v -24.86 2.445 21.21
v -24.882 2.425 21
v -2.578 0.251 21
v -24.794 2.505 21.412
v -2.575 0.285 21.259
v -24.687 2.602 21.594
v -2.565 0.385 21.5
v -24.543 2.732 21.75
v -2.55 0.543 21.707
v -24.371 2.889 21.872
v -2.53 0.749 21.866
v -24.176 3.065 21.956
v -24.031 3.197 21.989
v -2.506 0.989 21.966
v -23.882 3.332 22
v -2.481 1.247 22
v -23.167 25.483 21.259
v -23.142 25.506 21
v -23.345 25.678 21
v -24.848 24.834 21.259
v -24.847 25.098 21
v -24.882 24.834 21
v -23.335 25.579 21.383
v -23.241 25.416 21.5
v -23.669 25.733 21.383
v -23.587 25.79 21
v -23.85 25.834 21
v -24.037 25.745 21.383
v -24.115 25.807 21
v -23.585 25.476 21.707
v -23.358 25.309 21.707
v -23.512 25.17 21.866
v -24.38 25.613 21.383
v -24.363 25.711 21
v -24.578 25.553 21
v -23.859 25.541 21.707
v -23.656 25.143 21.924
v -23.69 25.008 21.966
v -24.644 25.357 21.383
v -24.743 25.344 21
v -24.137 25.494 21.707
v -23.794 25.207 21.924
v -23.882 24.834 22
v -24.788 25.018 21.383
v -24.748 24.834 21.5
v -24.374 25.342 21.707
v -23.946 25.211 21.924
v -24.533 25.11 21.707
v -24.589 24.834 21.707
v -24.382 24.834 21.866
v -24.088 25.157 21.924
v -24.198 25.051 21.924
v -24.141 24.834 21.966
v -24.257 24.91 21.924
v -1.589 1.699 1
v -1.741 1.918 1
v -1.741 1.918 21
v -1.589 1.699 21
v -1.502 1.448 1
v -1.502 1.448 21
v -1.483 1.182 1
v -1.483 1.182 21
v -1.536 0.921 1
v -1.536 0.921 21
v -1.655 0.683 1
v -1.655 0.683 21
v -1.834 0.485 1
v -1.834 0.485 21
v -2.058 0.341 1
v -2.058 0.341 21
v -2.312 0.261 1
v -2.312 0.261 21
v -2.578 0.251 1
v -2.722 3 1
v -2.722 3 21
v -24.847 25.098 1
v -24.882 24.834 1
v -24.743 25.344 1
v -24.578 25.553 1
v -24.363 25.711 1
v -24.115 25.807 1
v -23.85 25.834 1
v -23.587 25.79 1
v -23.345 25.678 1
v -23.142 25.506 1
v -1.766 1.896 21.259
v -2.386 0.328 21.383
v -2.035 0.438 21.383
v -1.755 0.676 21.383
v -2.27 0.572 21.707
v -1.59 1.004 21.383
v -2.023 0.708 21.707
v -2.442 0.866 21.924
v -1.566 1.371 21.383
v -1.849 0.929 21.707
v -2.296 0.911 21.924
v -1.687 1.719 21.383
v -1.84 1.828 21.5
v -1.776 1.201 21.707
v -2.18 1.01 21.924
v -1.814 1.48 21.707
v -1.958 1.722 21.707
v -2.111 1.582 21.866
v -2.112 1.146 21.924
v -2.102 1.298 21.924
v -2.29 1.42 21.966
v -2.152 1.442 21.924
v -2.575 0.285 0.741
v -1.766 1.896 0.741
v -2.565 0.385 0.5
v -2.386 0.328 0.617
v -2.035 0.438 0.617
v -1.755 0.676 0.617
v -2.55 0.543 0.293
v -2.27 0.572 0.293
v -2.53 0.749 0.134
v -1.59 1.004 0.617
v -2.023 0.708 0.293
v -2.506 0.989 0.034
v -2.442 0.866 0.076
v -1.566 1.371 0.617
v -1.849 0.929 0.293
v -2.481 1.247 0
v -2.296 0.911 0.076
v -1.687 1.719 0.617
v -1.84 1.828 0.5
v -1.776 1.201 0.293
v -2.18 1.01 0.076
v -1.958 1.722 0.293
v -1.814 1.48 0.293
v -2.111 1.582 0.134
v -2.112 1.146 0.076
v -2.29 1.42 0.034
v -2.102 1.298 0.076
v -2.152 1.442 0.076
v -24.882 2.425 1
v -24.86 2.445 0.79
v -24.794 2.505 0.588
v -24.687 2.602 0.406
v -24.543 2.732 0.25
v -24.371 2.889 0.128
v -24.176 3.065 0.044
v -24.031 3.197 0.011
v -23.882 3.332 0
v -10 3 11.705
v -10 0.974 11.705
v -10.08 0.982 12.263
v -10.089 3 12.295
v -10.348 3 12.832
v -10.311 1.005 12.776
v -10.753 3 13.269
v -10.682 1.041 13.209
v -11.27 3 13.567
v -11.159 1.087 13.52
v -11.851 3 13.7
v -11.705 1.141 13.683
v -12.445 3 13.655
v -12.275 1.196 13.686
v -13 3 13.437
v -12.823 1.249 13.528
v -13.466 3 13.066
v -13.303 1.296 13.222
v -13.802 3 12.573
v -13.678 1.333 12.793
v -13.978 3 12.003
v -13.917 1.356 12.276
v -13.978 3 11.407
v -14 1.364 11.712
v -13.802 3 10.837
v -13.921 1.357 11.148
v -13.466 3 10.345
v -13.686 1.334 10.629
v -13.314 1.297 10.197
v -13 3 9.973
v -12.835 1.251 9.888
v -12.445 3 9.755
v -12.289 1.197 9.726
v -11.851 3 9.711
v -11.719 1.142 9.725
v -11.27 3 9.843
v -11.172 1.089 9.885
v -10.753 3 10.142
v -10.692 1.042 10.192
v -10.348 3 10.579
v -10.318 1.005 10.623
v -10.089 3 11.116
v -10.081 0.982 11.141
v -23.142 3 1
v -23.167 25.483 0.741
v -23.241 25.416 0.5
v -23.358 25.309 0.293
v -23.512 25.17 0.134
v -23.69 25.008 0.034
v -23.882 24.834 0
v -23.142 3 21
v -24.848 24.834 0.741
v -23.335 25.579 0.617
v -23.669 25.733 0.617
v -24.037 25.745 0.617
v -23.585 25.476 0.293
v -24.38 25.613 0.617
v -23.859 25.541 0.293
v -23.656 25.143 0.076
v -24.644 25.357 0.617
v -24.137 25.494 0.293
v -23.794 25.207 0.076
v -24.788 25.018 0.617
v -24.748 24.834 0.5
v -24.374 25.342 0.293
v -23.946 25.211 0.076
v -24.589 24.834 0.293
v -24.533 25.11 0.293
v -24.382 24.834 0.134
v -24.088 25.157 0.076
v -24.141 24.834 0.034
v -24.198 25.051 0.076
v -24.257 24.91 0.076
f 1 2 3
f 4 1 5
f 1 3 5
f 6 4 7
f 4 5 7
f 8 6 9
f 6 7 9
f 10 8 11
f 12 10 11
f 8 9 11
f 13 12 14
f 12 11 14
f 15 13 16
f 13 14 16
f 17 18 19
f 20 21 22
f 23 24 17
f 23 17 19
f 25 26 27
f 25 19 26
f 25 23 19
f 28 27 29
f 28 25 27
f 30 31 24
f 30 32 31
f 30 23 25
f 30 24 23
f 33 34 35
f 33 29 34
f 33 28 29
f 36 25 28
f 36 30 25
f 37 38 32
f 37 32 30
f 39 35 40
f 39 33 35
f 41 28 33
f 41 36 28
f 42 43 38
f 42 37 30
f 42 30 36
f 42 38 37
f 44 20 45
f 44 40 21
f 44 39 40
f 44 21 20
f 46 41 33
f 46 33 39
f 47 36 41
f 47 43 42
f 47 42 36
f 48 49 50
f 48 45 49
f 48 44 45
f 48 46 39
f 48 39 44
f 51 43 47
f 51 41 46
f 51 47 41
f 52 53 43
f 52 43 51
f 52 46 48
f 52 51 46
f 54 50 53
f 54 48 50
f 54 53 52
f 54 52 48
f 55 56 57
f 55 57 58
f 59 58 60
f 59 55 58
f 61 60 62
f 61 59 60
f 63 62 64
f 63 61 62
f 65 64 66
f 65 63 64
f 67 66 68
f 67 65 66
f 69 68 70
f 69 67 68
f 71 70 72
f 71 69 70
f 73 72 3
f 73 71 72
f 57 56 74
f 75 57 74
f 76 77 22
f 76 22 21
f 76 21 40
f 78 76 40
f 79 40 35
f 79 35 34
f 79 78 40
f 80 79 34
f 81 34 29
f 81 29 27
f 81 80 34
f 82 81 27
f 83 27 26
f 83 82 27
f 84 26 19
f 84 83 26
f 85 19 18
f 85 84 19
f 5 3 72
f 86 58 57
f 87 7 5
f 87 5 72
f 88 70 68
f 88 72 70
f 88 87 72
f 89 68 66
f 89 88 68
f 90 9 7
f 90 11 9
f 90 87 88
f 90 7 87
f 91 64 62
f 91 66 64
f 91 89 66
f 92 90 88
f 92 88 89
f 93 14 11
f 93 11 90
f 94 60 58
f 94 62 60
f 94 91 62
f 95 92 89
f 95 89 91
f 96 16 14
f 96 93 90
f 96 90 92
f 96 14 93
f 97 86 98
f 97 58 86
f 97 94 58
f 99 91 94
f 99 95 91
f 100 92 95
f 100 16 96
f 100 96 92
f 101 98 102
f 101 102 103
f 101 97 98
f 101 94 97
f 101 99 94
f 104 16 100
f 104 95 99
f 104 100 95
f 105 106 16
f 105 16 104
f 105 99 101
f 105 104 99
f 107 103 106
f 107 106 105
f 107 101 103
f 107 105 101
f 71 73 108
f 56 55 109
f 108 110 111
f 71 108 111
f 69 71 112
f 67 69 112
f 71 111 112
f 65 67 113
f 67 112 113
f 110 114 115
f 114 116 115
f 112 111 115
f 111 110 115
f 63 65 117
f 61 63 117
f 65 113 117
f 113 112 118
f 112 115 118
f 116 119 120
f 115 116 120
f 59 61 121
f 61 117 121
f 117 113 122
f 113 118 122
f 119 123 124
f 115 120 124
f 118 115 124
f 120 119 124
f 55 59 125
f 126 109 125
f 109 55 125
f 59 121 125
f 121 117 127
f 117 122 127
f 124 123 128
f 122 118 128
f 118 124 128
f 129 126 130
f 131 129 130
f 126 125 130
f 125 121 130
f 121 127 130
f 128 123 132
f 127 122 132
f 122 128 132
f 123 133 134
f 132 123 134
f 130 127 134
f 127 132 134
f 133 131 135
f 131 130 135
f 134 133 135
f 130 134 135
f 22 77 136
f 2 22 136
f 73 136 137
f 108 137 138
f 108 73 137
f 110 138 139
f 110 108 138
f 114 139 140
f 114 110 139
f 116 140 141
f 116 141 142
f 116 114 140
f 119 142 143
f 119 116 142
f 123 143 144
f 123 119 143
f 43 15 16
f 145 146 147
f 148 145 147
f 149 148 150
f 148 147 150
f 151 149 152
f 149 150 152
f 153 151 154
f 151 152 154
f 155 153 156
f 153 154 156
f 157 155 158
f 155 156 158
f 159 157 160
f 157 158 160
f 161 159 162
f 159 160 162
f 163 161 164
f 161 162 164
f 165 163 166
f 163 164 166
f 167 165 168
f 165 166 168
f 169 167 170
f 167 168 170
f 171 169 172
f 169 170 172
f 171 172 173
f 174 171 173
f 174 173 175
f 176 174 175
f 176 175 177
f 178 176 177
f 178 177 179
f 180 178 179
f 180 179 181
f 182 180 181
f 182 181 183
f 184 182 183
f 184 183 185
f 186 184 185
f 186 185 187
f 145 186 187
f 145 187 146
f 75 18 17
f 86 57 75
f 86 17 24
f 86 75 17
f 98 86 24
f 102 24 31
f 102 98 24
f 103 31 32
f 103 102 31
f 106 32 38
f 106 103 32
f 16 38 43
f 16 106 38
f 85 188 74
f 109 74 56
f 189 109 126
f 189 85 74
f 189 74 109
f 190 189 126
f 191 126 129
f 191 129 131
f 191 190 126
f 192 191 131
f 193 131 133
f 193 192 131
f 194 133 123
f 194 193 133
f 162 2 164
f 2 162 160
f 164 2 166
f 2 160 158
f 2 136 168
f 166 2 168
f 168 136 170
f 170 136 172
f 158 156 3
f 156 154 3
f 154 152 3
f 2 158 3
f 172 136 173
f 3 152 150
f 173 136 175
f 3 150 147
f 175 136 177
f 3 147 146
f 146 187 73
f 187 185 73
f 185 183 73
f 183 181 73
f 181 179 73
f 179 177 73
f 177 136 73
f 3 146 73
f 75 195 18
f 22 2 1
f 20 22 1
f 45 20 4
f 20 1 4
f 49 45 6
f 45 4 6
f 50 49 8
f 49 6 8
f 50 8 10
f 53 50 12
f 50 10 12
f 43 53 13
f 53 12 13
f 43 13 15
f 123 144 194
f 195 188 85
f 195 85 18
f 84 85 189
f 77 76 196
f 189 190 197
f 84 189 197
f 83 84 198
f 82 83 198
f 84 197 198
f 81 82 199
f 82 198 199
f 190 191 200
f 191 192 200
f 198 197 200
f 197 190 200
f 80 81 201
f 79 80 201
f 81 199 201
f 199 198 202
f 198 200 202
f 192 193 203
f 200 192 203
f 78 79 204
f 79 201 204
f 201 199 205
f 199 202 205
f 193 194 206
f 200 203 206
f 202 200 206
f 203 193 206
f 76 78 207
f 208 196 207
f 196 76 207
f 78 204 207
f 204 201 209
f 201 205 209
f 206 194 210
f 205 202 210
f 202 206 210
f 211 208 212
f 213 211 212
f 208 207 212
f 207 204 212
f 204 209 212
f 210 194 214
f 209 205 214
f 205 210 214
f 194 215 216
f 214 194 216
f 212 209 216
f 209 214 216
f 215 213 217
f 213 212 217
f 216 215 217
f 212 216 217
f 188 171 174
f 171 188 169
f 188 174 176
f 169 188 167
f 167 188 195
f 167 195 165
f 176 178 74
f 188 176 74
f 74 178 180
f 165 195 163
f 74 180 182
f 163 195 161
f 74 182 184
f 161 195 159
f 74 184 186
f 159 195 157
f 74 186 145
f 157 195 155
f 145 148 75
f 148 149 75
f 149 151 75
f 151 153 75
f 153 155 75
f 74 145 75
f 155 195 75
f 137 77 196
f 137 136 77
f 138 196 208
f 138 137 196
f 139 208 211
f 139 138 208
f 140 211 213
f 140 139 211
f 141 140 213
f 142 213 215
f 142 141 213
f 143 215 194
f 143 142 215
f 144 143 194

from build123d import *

# Parameters (mm, degrees)
F1_DEPTH     = 22
F2_R         = 1
F3_T1_DEPTH  = 31.8493182741
F3_T3_DEPTH  = 27.4759989859
F3_T8_DEPTH  = 1
F3_T14_DEPTH = 1
F4_R         = 1
F6_W         = 20.563358571
F6_H         = 20
F7_DEPTH     = 25
F9_D         = 4


# Not quite as in the source:
# - a fillet or chamfer that OpenCascade refuses, or shapes differently, is made with other operations: its cross-section is extruded or revolved along the edge and cut away or added


with BuildPart() as f1:
    # F0 (on Top) → F1 (new body)
    with BuildSketch(Plane.XY):
        Polygon((-24.8821492983, 2.4245919862), (0, 0), (-24.8821492983, 27.4245919862), align=None)
    extrude(amount=F1_DEPTH)

    # F2
    f2_edges = [f1.edges().sort_by_distance(p)[0] for p in [
        (-24.882149, 14.924592, 22),
        (-12.441075, 1.212296, 22),
    ]]
    fillet(f2_edges, radius=F2_R)

    # F3: fillet of radius 1 on 1 edges, made by hand

    # F3_s2 → F3_t1 (cut)
    with BuildSketch(Plane(origin=(-1.7406023493, 1.9184560251, 0), x_dir=(0, 0, 1), z_dir=(-0.6719435693, 0.7406023493, 0))):
        with BuildLine():
            ThreePointArc((21, 0), (21.7071067812, -0.2928932188), (22, -1))
            Line((22, -1), (22, 0))
            Line((22, 0), (21, 0))
        make_face()
    extrude(amount=F3_T1_DEPTH, mode=Mode.SUBTRACT)

    # F3_s4 → F3_t3 (cut)
    with BuildSketch(Plane.XY.offset(-6.4759989859)):
        with BuildLine():
            ThreePointArc((-24.8821492983, 24.8341923918), (-24.2422865296, 25.7670917297), (-23.141546949, 25.5061359611))
            Line((-23.141546949, 25.5061359611), (-24.8821492983, 27.4245919862))
            Line((-24.8821492983, 27.4245919862), (-24.8821492983, 24.8341923918))
        make_face()
        with BuildLine():
            ThreePointArc((-1.7406023493, 1.9184560251), (-1.5876305081, 0.7975969112), (-2.578188378, 0.2512264839))
            Line((-2.578188378, 0.2512264839), (0, 0))
            Line((0, 0), (-1.7406023493, 1.9184560251))
        make_face()
    extrude(amount=F3_T3_DEPTH, mode=Mode.SUBTRACT)


with BuildPart() as f3_tool6:
    # F3_s7 → F3_t8 (new body)
    with BuildSketch(Plane.XY.offset(21)):
        Polygon((-2.4812046985, 1.2465124558), (-1.7406023493, 1.9184560251), (0, 0), (-2.578188378, 0.2512264839), align=None)
    extrude(amount=F3_T8_DEPTH)

    # F3_s9 → F3_t10 (revolve, cut)
    with BuildSketch(Plane(origin=(-2.4812046985, 1.2465124558, 21), x_dir=(-0.8935741904, 0.4489155446, 0), z_dir=(0.4489155446, 0.8935741904, 0))):
        with BuildLine():
            ThreePointArc((0, -1), (1, 0), (0, 1))
            Line((0, 1), (0, -1))
        make_face()
    revolve(axis=Axis((-2.4812046985, 1.2465124558, 21), (0, 0, 1)), mode=Mode.SUBTRACT)


with BuildPart() as f1_1:
    add(f1.part)

    # F3_t5: cut F3_tool6
    add(f3_tool6.part, mode=Mode.SUBTRACT)


with BuildPart() as f3_tool12:
    # F3_s13 → F3_t14 (new body)
    with BuildSketch(Plane.XY.offset(21)):
        Polygon((-23.8821492983, 24.8341923918), (-24.8821492983, 24.8341923918), (-24.8821492983, 27.4245919862), (-23.141546949, 25.5061359611), align=None)
    extrude(amount=F3_T14_DEPTH)

    # F3_s15 → F3_t16 (revolve, cut)
    with BuildSketch(Plane(origin=(-23.8821492983, 24.8341923918, 21), x_dir=(0.3601372313, -0.9328993379, 0), z_dir=(-0.9328993379, -0.3601372313, 0))):
        with BuildLine():
            ThreePointArc((0, -1), (1, 0), (0, 1))
            Line((0, 1), (0, -1))
        make_face()
    revolve(axis=Axis((-23.8821492983, 24.8341923918, 21), (0, 0, 1)), mode=Mode.SUBTRACT)


with BuildPart() as f1_2:
    add(f1_1.part)

    # F3_t11: cut F3_tool12
    add(f3_tool12.part, mode=Mode.SUBTRACT)

    # F4
    f4_edges = [f1_2.edges().sort_by_distance(p)[0] for p in [
        (-13.730169, 1.337909, 0),
    ]]
    fillet(f4_edges, radius=F4_R)

    # F6 (on offset) → F7 (cut)
    with BuildSketch(Plane.XZ.offset(-3)):
        with Locations((-12.8598676635, 11)):
            Rectangle(F6_W, F6_H)
    extrude(amount=-F7_DEPTH, mode=Mode.SUBTRACT)

    # F9 (through all)
    with Locations(Plane(origin=(0, 3, 0), x_dir=(-1, 0, 0), z_dir=(0, 1, 0))):
        with Locations((12.000261806, 11.7051936686)):
            Hole(F9_D / 2)


solid = f1_2.part
